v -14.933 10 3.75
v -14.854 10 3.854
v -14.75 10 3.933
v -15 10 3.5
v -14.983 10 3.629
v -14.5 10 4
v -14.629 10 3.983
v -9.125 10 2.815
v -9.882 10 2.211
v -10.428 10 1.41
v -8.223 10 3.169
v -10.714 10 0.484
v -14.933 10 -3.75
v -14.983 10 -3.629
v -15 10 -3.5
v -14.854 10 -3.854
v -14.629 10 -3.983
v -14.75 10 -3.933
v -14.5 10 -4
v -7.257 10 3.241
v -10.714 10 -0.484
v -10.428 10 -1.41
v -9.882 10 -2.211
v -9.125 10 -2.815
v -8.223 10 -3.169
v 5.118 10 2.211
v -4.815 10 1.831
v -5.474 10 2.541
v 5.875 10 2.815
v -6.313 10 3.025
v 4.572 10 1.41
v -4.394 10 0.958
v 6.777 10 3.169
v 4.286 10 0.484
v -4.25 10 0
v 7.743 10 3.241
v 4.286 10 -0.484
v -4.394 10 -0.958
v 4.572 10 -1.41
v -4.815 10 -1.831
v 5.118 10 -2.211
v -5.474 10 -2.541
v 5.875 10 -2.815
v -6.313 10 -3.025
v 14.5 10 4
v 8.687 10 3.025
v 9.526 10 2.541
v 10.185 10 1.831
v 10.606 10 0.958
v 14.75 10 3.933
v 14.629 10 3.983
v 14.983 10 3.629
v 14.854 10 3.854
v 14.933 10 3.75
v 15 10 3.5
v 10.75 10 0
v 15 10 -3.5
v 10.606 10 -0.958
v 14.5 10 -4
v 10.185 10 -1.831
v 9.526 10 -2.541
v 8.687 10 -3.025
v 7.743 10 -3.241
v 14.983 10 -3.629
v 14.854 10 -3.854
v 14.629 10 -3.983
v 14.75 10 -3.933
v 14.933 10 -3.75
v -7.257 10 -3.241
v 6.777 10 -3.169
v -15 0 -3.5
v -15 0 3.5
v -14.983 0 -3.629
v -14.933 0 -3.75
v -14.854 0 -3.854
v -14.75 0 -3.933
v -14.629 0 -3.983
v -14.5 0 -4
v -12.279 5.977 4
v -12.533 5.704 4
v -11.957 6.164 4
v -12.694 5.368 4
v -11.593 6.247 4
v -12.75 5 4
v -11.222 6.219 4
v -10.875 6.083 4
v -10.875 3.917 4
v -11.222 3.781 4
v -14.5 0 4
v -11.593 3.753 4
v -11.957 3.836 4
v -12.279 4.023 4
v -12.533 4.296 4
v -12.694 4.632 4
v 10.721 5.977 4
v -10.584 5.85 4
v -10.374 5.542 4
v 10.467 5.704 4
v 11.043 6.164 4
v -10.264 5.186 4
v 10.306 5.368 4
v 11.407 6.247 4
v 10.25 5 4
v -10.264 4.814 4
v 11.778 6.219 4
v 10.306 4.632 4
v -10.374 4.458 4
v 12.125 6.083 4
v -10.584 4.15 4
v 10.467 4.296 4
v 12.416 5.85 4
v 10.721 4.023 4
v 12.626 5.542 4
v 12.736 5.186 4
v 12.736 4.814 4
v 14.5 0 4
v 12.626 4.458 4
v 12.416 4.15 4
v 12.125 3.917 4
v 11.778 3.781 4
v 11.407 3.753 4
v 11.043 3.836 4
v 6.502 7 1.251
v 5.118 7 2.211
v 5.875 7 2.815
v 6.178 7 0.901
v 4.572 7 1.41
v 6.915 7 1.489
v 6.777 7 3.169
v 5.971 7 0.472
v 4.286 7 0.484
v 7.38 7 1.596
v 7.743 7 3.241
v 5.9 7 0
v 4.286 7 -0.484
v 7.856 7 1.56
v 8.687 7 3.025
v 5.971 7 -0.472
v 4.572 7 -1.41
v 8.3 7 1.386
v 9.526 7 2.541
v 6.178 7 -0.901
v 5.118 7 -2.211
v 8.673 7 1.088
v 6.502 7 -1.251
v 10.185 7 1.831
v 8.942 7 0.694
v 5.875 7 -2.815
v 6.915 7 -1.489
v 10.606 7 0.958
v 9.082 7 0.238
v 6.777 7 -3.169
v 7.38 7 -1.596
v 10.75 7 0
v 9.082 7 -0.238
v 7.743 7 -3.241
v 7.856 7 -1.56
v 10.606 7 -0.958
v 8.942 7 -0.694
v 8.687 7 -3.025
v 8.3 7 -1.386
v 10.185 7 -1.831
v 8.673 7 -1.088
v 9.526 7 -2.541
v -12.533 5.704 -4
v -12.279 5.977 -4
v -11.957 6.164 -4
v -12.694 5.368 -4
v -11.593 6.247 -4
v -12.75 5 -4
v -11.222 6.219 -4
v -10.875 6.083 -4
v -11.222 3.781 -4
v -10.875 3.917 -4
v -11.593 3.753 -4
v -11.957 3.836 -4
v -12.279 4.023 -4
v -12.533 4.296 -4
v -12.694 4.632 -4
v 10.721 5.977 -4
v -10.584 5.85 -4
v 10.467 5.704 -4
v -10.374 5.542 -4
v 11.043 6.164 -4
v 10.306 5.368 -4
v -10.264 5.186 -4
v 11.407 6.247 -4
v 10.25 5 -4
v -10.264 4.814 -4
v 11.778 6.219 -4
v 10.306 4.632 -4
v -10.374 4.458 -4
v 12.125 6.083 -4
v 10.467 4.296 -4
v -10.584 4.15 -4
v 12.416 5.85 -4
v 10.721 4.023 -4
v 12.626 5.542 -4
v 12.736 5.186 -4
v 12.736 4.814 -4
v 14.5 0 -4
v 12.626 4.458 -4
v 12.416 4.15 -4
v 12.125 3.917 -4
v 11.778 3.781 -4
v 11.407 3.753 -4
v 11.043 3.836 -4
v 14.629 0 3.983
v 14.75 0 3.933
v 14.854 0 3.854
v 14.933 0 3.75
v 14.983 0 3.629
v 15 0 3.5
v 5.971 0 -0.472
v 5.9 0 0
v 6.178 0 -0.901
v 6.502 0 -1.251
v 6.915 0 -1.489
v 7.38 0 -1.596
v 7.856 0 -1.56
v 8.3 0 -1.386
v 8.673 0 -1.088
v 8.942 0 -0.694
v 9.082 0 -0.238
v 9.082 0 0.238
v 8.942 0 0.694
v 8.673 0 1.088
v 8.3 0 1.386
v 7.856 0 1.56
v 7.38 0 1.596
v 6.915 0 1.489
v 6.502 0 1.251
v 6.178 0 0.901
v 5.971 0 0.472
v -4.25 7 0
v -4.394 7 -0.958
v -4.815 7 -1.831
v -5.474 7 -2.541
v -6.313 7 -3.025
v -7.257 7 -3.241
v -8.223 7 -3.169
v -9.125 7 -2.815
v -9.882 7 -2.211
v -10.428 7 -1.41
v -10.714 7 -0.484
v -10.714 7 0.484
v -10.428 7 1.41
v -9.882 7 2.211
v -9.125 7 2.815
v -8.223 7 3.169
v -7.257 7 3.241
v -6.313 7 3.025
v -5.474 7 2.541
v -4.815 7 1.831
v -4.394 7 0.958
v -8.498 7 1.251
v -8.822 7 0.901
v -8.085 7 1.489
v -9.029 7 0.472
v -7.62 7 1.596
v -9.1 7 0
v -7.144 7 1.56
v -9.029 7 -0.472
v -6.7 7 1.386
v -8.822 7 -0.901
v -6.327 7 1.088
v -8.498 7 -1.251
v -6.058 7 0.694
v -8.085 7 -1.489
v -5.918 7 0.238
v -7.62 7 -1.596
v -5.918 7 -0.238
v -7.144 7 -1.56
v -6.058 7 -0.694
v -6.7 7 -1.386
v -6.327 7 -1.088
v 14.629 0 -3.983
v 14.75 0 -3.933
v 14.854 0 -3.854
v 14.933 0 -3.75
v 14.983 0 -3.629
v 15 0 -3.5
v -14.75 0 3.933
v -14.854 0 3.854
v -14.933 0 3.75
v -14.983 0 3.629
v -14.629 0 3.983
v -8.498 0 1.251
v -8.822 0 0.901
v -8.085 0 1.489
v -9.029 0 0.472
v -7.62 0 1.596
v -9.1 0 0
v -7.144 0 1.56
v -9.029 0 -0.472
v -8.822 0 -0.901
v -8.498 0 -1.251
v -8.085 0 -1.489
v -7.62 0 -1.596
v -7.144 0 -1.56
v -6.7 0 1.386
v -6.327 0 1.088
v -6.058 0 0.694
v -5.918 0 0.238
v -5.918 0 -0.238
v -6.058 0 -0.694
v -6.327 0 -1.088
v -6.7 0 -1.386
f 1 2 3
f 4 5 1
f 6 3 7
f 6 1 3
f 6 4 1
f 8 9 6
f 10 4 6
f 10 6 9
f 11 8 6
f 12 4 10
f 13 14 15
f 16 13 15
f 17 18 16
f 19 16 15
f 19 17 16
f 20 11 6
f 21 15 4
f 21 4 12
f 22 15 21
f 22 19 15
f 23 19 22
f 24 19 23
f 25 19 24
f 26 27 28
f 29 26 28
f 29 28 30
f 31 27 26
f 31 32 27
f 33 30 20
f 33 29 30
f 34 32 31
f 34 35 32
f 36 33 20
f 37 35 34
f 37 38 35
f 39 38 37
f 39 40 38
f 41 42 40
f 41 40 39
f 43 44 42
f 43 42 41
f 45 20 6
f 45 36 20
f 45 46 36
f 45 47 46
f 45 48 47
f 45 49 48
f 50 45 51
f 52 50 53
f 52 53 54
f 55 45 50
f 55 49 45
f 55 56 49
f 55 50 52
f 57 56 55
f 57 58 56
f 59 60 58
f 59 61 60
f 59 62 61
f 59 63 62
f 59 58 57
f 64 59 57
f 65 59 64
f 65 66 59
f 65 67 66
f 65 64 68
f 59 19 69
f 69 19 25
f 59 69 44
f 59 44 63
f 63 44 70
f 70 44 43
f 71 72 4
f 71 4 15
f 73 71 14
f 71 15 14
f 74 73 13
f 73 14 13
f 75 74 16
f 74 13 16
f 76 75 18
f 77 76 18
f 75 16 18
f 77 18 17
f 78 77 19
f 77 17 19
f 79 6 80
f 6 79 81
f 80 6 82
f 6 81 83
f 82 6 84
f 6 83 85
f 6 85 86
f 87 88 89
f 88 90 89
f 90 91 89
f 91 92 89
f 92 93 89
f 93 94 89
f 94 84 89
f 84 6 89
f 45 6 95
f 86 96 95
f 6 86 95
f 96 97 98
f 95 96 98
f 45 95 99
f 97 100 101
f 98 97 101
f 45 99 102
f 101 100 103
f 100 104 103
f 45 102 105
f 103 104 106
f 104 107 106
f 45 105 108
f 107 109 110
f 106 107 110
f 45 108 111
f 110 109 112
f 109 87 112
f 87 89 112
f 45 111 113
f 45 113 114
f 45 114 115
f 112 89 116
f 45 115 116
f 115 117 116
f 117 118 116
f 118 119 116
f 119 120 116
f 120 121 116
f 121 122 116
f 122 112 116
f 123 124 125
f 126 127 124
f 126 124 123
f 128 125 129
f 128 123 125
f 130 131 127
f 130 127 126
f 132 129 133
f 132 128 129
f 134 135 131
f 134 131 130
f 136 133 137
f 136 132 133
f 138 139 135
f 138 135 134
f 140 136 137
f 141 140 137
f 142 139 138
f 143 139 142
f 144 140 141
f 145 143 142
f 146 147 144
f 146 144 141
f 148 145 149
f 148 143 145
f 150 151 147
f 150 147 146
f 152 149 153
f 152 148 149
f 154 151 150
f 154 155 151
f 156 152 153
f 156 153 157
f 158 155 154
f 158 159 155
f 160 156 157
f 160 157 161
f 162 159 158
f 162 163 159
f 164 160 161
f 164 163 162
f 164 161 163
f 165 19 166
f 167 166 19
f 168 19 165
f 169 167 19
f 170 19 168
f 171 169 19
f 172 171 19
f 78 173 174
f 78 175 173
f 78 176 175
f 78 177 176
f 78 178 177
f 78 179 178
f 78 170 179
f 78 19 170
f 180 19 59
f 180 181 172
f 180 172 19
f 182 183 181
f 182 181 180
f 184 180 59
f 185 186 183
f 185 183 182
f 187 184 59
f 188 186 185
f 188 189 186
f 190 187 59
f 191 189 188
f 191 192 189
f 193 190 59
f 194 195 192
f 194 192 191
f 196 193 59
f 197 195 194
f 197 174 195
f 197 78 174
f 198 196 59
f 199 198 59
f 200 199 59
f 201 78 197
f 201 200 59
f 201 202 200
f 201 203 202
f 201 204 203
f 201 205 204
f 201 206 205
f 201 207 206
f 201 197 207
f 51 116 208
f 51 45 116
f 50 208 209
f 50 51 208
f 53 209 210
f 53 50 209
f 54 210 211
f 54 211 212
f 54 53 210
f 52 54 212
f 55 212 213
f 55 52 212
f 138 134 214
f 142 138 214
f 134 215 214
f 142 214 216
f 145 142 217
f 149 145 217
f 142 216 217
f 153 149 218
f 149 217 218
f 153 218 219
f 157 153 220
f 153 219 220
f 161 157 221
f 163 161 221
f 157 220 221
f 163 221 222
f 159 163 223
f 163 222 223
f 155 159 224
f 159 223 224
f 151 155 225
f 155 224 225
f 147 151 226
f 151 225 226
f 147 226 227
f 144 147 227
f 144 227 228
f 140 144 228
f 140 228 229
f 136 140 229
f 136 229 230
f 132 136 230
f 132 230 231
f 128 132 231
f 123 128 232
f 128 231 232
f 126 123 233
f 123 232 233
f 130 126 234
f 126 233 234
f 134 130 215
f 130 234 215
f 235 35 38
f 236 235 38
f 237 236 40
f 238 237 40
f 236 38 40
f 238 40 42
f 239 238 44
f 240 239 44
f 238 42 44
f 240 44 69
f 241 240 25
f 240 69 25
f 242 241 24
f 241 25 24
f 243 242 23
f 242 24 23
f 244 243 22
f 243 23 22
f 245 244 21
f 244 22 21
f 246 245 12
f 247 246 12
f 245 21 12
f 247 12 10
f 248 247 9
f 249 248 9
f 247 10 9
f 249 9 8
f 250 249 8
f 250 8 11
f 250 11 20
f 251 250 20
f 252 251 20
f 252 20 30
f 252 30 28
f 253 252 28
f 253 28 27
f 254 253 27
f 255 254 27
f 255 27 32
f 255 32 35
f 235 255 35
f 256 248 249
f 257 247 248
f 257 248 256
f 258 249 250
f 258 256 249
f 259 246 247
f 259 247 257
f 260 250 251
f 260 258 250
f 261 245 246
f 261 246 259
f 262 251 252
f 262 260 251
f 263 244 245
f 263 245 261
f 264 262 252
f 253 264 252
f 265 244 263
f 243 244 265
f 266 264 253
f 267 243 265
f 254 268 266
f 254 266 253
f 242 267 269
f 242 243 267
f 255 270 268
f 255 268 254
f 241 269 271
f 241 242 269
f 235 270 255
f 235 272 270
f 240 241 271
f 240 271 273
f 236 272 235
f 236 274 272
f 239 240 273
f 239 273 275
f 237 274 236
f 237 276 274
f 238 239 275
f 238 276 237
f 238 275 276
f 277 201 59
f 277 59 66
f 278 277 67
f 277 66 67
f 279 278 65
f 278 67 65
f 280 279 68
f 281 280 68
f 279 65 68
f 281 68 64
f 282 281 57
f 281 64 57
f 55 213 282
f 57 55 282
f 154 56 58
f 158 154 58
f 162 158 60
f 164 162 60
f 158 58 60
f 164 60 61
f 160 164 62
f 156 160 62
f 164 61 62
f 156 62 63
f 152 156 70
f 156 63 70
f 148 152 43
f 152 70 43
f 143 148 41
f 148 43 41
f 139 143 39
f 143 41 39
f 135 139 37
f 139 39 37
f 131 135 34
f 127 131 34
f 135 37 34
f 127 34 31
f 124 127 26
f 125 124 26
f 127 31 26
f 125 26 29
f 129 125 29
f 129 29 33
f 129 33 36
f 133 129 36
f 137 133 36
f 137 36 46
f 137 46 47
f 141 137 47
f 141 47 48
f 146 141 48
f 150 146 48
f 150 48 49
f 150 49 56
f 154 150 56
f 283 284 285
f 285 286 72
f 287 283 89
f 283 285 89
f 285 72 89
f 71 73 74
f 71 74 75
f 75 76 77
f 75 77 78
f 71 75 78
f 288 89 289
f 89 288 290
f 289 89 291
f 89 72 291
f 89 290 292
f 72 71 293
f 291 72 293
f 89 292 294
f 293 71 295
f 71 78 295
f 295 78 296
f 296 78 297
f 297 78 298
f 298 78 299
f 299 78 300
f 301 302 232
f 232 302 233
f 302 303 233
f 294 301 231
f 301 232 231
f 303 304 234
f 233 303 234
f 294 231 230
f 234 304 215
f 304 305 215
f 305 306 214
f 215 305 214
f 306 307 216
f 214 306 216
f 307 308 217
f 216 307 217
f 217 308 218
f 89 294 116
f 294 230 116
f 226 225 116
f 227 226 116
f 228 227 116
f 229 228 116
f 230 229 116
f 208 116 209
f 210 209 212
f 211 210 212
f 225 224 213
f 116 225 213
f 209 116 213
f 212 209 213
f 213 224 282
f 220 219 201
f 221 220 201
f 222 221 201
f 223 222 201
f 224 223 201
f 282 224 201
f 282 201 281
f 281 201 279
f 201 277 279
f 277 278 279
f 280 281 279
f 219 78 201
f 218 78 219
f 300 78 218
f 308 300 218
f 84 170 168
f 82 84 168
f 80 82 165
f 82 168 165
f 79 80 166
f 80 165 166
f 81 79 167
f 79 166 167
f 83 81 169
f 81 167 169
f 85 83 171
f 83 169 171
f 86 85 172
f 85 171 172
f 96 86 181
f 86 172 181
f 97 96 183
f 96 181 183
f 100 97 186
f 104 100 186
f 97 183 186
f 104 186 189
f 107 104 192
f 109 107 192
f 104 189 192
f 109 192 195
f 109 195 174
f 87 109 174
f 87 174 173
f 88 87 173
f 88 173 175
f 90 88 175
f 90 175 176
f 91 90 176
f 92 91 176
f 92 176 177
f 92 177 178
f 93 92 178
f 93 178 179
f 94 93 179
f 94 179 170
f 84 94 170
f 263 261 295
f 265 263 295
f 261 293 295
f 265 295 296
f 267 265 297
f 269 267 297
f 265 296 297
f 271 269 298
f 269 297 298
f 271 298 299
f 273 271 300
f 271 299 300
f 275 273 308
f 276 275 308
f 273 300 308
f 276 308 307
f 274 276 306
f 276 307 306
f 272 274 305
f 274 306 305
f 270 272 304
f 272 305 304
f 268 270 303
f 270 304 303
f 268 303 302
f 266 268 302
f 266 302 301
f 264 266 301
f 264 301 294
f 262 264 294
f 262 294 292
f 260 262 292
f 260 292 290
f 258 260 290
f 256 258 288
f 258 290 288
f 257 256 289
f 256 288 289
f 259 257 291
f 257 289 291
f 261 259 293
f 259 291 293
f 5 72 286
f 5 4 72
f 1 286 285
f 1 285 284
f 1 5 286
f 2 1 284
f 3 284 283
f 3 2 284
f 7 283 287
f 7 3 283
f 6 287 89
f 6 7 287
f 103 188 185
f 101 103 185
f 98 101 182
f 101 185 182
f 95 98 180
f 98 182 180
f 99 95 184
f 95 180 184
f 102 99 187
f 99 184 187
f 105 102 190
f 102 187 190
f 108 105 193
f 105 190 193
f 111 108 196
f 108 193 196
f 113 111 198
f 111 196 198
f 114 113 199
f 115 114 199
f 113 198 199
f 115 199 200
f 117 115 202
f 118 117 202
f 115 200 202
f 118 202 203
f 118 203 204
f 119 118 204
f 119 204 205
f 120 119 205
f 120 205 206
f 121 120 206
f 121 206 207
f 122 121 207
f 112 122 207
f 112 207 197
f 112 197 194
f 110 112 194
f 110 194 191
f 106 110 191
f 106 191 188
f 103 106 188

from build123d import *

# Parameters (mm, degrees)
SKETCH1_W                      = 30
SKETCH1_H                      = 8
BOSS_EXTRUDE1_DEPTH            = 10
CBORE_FOR_M3_SHCS2_D           = 3.2
CBORE_FOR_M3_SHCS2_CBORE_D     = 6.5
CBORE_FOR_M3_SHCS2_CBORE_DEPTH = 3
TAP_DRILL_FOR_M3X0_5_TAP1_D    = 2.5
FILLET1_R                      = 0.5


with BuildPart() as part:
    # Sketch1 → Boss-Extrude1 (new body)
    with BuildSketch(Plane(origin=(0, 0, 0), x_dir=(1, 0, 0), z_dir=(0, 1, 0))):
        Rectangle(SKETCH1_W, SKETCH1_H)
    extrude(amount=BOSS_EXTRUDE1_DEPTH)

    # CBORE for M3 SHCS2 (through all)
    with Locations(Plane(origin=(0, 10, 0), x_dir=(1, 0, 0), z_dir=(0, 1, 0))):
        with Locations((-7.5, 0), (7.5, 0)):
            CounterBoreHole(CBORE_FOR_M3_SHCS2_D / 2, CBORE_FOR_M3_SHCS2_CBORE_D / 2, CBORE_FOR_M3_SHCS2_CBORE_DEPTH)

    # Tap Drill for M3x0.5 Tap1 (through all)
    with Locations(Plane.XY.offset(4)):
        with Locations((-11.5, 5), (11.5, 5)):
            Hole(TAP_DRILL_FOR_M3X0_5_TAP1_D / 2)

    # Fillet1
    fillet1_edges = [part.edges().sort_by_distance(p)[0] for p in [
        (-15, 5, -4),
        (15, 5, -4),
        (15, 5, 4),
        (-15, 5, 4),
    ]]
    fillet(fillet1_edges, radius=FILLET1_R)


solid = part.part
